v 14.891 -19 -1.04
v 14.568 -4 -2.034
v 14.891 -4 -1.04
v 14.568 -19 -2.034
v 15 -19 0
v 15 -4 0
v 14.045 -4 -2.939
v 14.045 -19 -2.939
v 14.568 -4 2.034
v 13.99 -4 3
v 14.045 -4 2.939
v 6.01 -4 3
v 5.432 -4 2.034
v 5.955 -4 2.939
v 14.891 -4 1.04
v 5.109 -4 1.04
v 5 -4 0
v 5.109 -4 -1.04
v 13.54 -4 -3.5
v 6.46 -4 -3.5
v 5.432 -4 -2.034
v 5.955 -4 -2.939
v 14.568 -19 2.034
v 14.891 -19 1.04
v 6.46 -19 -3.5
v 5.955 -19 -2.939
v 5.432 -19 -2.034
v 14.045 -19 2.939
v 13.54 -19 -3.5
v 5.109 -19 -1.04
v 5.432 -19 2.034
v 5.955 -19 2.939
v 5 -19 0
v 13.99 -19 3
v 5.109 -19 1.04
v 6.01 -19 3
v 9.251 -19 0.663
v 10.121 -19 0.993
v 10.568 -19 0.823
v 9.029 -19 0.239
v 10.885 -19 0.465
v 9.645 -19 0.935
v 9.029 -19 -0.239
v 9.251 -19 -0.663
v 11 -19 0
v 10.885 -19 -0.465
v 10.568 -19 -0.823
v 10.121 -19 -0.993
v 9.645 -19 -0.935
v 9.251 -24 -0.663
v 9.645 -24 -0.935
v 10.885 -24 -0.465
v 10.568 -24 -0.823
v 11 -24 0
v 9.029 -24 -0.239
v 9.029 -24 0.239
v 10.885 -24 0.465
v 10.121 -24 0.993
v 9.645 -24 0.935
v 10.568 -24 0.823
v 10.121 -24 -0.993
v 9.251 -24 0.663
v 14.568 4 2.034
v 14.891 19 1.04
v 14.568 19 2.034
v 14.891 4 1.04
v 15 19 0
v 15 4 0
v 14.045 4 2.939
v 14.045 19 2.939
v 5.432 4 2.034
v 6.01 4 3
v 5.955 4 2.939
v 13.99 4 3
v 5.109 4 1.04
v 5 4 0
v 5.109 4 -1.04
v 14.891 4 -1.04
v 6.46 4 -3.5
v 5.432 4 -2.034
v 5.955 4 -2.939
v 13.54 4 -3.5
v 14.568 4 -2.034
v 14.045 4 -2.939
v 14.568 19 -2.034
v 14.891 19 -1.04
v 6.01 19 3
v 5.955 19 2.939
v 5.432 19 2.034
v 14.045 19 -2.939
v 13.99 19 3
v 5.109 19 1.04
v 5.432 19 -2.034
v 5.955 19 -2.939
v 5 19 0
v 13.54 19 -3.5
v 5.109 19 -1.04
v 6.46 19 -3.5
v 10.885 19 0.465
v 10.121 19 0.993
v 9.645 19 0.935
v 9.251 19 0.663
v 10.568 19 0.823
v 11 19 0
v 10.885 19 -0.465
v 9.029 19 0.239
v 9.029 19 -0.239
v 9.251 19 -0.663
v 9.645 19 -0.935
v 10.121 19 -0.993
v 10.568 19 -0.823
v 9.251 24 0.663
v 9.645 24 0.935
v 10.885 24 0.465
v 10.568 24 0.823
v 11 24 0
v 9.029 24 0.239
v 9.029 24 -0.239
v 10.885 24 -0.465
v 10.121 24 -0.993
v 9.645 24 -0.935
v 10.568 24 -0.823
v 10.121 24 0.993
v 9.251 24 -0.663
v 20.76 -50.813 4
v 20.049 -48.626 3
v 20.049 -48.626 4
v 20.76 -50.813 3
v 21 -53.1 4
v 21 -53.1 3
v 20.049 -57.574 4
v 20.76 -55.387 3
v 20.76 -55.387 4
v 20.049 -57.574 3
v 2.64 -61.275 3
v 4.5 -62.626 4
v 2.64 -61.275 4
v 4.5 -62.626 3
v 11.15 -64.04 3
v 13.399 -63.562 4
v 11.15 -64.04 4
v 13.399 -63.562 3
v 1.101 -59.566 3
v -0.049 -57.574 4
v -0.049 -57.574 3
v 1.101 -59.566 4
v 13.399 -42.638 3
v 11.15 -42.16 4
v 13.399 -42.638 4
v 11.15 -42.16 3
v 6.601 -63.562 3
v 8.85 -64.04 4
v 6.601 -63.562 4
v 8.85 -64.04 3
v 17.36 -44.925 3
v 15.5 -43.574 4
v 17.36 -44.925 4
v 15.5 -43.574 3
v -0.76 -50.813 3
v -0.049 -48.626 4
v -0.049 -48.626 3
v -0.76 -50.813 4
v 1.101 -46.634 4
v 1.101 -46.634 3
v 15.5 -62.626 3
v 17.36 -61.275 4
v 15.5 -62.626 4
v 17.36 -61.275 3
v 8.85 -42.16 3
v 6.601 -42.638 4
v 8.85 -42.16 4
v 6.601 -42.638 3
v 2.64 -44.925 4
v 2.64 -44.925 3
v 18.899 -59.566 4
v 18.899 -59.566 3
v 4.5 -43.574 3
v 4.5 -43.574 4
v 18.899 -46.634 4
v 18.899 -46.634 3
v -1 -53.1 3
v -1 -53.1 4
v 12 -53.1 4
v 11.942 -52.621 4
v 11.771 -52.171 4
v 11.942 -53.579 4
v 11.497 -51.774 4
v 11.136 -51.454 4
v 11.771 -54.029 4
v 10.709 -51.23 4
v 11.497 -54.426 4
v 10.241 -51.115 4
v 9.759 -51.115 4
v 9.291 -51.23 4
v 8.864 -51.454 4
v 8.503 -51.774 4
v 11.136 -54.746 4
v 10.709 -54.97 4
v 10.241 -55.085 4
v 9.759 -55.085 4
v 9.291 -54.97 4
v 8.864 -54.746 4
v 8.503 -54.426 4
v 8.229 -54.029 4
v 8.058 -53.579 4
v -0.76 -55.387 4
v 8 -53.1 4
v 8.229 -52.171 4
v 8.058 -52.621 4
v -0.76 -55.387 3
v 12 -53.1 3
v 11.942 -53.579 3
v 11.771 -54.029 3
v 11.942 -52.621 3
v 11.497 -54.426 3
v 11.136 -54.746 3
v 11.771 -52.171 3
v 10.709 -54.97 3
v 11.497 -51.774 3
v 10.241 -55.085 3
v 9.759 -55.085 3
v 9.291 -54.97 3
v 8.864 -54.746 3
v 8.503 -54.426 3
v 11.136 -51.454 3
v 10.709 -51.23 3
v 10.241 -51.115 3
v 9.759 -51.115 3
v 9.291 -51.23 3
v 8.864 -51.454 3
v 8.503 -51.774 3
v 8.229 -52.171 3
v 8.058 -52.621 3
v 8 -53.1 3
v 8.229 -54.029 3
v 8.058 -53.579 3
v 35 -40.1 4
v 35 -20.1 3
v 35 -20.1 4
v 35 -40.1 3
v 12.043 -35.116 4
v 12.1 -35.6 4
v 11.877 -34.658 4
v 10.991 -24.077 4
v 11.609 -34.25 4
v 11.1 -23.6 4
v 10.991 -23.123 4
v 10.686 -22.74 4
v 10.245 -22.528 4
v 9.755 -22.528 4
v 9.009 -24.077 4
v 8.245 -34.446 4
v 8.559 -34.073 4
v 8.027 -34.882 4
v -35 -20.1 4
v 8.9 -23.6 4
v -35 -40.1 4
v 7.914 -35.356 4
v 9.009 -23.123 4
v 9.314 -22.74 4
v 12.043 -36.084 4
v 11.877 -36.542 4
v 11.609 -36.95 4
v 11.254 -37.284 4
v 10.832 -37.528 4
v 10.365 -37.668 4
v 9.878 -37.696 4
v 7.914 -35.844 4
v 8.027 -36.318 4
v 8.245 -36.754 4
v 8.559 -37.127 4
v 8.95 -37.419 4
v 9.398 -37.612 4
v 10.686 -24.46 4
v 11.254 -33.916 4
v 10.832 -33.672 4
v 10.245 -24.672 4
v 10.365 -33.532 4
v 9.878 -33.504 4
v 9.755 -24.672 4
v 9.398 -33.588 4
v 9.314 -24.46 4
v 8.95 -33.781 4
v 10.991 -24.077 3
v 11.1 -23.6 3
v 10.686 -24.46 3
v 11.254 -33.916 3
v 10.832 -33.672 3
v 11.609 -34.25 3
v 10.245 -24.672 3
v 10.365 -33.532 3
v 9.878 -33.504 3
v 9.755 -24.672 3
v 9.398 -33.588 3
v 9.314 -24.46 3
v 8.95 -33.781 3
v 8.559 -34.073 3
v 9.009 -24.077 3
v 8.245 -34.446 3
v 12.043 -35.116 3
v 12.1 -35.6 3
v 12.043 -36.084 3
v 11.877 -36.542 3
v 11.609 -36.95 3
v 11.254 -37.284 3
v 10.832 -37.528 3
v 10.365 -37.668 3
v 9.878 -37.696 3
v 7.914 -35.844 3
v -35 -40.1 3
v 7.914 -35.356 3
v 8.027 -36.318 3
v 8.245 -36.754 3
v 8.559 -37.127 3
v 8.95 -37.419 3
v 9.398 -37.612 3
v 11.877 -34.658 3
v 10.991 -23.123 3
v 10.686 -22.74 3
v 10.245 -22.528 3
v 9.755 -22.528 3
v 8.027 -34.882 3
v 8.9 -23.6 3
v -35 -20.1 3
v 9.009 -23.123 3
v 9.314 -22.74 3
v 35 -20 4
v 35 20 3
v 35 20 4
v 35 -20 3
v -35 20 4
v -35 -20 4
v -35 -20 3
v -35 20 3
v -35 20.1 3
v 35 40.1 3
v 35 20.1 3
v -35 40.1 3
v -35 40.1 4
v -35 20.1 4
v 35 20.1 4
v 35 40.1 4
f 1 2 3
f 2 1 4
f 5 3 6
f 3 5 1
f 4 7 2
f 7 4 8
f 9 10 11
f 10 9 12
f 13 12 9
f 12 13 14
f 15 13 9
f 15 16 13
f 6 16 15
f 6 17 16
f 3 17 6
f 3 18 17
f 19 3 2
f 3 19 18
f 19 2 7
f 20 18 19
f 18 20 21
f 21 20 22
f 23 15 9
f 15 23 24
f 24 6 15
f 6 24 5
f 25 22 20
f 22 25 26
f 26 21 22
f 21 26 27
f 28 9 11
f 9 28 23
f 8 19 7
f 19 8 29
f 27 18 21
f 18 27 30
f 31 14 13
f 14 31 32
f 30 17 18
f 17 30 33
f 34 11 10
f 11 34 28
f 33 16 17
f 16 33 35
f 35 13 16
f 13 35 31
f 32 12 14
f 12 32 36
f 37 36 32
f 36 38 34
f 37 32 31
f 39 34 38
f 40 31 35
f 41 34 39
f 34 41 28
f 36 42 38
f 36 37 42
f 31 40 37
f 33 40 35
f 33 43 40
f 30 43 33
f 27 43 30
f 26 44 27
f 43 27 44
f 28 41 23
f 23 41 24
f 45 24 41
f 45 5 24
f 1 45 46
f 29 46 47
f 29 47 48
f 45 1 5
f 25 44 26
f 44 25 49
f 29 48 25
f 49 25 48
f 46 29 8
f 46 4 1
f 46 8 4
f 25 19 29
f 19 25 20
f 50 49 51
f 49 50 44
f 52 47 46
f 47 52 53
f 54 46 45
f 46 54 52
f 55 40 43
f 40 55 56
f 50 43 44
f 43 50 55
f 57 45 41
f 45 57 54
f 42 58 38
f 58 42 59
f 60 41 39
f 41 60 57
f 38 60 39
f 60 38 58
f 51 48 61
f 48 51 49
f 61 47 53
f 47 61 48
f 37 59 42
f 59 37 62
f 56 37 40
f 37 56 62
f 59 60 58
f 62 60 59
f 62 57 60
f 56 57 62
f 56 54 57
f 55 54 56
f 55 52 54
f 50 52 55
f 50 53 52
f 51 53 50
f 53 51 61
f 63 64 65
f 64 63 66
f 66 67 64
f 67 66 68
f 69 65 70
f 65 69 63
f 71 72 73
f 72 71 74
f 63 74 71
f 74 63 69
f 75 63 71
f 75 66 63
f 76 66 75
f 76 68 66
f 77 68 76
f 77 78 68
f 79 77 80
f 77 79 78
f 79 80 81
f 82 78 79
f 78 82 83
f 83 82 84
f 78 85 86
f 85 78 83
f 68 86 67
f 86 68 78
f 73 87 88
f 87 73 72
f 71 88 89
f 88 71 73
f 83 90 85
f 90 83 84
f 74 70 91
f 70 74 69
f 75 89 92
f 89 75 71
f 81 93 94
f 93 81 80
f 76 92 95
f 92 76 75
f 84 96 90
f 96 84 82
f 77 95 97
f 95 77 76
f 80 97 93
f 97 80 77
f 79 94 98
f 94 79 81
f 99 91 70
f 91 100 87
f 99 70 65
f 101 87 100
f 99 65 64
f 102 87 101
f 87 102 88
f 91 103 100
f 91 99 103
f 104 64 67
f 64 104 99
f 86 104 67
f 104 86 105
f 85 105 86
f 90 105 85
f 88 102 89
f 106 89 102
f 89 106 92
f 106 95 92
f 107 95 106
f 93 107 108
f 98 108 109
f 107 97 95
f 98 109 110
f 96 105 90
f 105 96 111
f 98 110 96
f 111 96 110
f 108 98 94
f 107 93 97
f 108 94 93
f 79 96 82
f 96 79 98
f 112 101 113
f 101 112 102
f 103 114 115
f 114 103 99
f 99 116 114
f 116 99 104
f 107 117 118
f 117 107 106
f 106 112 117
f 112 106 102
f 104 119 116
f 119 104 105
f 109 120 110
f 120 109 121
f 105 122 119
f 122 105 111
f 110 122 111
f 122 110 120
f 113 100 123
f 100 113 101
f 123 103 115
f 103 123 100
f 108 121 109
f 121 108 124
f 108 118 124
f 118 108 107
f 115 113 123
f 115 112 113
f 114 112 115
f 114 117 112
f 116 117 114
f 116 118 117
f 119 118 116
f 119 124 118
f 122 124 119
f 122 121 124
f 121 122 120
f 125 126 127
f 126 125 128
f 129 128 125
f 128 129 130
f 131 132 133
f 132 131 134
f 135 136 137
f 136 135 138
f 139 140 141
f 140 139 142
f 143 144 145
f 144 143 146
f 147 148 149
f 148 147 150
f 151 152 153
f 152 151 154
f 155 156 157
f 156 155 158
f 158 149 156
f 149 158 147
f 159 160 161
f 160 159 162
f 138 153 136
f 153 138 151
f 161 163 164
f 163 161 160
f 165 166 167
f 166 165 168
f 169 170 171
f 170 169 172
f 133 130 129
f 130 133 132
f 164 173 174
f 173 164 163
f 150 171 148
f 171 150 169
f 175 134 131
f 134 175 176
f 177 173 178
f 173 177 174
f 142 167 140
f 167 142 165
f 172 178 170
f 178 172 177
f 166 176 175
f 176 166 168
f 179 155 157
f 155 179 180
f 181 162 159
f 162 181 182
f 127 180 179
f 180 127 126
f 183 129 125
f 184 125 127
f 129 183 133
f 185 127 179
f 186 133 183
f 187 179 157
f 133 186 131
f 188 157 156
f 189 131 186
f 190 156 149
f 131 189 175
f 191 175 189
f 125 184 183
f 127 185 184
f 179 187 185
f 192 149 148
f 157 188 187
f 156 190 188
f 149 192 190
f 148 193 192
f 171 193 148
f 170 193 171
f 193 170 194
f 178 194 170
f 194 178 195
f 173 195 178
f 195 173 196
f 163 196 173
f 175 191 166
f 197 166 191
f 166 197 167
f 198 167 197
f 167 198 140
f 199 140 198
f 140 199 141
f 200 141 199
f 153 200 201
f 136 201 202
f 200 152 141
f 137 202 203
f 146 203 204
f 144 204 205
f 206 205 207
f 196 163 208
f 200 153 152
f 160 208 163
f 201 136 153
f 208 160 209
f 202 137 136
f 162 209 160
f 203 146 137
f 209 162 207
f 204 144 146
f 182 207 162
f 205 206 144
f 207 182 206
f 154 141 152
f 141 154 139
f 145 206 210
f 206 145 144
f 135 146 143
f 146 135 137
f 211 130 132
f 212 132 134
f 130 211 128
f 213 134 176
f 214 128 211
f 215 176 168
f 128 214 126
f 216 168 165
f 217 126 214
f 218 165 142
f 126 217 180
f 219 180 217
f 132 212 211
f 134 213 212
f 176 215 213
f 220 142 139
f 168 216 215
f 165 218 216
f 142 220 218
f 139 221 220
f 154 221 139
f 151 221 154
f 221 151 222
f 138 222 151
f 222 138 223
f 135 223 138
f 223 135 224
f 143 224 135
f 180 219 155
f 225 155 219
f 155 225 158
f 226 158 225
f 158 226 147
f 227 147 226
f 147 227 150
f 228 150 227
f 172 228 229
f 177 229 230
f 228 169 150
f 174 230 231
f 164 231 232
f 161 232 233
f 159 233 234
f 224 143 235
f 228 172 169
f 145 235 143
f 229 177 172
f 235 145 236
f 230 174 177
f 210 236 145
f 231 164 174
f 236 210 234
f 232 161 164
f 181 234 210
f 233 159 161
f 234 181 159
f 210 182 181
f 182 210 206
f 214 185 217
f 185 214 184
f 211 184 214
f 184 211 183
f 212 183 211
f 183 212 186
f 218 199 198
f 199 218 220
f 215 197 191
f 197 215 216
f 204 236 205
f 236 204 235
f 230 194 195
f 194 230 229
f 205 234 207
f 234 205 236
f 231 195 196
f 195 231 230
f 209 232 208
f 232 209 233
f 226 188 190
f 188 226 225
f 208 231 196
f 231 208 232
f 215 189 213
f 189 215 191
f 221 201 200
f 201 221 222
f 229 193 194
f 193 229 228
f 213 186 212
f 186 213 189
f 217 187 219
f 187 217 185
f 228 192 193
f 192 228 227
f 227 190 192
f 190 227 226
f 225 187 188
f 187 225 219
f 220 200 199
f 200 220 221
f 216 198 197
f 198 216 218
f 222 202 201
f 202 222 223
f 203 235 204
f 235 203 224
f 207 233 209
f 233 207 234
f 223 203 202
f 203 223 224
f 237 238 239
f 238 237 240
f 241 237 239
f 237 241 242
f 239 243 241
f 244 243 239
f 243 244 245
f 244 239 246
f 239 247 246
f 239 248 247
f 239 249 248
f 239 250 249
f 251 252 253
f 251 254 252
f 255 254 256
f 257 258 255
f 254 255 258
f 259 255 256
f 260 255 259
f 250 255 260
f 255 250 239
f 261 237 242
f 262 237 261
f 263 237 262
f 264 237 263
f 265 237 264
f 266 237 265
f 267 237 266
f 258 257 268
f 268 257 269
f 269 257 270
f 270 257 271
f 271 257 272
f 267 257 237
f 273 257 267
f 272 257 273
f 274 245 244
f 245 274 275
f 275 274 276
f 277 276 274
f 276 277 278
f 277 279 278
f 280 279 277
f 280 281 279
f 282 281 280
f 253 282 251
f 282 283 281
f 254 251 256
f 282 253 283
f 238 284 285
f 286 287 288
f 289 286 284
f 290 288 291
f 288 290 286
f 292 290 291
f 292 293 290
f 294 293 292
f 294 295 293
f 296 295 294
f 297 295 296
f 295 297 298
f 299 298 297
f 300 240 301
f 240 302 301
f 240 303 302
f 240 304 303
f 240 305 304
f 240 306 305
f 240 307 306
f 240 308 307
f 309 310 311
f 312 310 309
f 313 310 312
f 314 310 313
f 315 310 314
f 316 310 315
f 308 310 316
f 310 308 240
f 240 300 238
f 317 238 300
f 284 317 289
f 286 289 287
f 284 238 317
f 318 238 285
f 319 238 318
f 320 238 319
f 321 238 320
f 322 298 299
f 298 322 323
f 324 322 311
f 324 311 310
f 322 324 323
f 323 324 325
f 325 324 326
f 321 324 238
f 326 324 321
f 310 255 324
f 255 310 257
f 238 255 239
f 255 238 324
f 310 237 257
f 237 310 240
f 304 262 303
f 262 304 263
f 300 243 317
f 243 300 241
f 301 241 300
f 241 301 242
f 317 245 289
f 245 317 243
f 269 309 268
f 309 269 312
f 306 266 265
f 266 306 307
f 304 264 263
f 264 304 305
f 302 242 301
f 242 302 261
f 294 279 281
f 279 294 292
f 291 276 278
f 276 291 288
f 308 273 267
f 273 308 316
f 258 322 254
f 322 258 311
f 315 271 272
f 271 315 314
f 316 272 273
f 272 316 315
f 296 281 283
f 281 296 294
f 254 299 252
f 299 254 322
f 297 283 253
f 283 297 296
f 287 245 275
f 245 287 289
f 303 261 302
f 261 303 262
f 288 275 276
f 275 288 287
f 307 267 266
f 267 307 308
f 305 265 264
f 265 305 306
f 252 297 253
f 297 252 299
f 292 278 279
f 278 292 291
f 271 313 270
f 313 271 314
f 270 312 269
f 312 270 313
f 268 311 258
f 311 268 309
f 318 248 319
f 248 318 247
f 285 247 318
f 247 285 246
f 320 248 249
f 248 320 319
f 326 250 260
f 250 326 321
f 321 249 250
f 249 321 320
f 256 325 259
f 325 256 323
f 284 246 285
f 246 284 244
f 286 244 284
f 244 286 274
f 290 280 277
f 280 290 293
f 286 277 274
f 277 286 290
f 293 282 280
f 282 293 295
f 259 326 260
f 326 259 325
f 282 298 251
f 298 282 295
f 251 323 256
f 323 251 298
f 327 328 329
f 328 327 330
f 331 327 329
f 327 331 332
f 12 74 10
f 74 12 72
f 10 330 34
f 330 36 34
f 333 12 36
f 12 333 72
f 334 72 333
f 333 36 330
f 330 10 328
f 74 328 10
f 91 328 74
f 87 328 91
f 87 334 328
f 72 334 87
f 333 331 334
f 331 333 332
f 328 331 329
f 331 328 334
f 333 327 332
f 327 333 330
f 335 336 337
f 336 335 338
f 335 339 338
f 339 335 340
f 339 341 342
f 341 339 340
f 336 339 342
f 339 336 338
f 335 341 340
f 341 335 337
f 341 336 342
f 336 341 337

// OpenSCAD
$fs=0.5;

bot_body_width = 40;
bot_body_height = 20;
bot_body_length = 70;
bot_skin_thick = 1;
motor_body_height = 7;
motor_shaft_diameter = 2;
crease = .1;
bot_wheel_setback = 10;
bot_wheel_clearance = bot_skin_thick+1;
bot_wheel_shaft_r = 2;
bot_wheel_r = bot_body_height/2+1;

bot_wheel_c = bot_wheel_r+motor_body_height/2+motor_shaft_diameter/2;

folded = $t;

//platform
translate([bot_wheel_setback,-bot_body_width/2+bot_skin_thick,0]) 
  dc_motor_small();
translate([bot_wheel_setback,bot_body_width/2-bot_skin_thick,0]) rotate([180,0,0]) 
  dc_motor_small();
translate([0,0,motor_body_height/2]) //raise body off motors
  cube([bot_body_length, bot_body_width, bot_skin_thick],center=true);


//left wheel
translate([bot_wheel_setback,
			-(bot_body_width/2+crease+bot_wheel_clearance)
			-(bot_wheel_r+bot_body_height)*(1-folded),
			motor_body_height/2])
rotate([90*folded,0,0]) 
  translate([0,-bot_wheel_c*folded,0])
    difference() {
      cylinder(r=bot_wheel_r, h=bot_skin_thick,center=true);
      cylinder(r=bot_wheel_shaft_r, h=bot_skin_thick+crease,center=true);
      }

//left side
translate([0,-(bot_body_width/2)-crease,motor_body_height/2])
rotate([90*folded,0,0]) 
  difference() {
    translate([0,-bot_body_height/2,0])
	  cube([bot_body_length, bot_body_height, bot_skin_thick],center=true);
	translate([bot_wheel_setback,-bot_wheel_c,0]) //punch out main axle
	  cylinder(r=bot_wheel_shaft_r+crease, h=bot_skin_thick+crease, center=true);
	translate([bot_wheel_setback,-motor_body_height/2,0]) //punch out for motor shaft
	  cylinder(r=motor_shaft_diameter/2+crease, h=bot_skin_thick+crease, center=true);
	}


//right side
translate([0,(bot_body_width/2)+crease,motor_body_height/2])
rotate([180-90*folded,0,0]) 
  translate([0,-bot_body_height/2,0])
	cube([bot_body_length, bot_body_height, bot_skin_thick],center=true);

module dc_motor_small(
	body_length = 15,
	body_diameter = 10,
	body_height = 7,
	shaft_length = 5,
	shaft_diameter = 2)
{
	union() {
		intersection() {
			color("gray") rotate([-90,0,0]) cylinder(body_length, r=body_diameter/2);
			color("gray") cube([body_diameter, body_length*2, body_height],center=true);
			}
		translate([0,-shaft_length,0]) rotate([-90,0,0]) 
			color("silver") cylinder(shaft_length, r=shaft_diameter/2);
		}
	}
